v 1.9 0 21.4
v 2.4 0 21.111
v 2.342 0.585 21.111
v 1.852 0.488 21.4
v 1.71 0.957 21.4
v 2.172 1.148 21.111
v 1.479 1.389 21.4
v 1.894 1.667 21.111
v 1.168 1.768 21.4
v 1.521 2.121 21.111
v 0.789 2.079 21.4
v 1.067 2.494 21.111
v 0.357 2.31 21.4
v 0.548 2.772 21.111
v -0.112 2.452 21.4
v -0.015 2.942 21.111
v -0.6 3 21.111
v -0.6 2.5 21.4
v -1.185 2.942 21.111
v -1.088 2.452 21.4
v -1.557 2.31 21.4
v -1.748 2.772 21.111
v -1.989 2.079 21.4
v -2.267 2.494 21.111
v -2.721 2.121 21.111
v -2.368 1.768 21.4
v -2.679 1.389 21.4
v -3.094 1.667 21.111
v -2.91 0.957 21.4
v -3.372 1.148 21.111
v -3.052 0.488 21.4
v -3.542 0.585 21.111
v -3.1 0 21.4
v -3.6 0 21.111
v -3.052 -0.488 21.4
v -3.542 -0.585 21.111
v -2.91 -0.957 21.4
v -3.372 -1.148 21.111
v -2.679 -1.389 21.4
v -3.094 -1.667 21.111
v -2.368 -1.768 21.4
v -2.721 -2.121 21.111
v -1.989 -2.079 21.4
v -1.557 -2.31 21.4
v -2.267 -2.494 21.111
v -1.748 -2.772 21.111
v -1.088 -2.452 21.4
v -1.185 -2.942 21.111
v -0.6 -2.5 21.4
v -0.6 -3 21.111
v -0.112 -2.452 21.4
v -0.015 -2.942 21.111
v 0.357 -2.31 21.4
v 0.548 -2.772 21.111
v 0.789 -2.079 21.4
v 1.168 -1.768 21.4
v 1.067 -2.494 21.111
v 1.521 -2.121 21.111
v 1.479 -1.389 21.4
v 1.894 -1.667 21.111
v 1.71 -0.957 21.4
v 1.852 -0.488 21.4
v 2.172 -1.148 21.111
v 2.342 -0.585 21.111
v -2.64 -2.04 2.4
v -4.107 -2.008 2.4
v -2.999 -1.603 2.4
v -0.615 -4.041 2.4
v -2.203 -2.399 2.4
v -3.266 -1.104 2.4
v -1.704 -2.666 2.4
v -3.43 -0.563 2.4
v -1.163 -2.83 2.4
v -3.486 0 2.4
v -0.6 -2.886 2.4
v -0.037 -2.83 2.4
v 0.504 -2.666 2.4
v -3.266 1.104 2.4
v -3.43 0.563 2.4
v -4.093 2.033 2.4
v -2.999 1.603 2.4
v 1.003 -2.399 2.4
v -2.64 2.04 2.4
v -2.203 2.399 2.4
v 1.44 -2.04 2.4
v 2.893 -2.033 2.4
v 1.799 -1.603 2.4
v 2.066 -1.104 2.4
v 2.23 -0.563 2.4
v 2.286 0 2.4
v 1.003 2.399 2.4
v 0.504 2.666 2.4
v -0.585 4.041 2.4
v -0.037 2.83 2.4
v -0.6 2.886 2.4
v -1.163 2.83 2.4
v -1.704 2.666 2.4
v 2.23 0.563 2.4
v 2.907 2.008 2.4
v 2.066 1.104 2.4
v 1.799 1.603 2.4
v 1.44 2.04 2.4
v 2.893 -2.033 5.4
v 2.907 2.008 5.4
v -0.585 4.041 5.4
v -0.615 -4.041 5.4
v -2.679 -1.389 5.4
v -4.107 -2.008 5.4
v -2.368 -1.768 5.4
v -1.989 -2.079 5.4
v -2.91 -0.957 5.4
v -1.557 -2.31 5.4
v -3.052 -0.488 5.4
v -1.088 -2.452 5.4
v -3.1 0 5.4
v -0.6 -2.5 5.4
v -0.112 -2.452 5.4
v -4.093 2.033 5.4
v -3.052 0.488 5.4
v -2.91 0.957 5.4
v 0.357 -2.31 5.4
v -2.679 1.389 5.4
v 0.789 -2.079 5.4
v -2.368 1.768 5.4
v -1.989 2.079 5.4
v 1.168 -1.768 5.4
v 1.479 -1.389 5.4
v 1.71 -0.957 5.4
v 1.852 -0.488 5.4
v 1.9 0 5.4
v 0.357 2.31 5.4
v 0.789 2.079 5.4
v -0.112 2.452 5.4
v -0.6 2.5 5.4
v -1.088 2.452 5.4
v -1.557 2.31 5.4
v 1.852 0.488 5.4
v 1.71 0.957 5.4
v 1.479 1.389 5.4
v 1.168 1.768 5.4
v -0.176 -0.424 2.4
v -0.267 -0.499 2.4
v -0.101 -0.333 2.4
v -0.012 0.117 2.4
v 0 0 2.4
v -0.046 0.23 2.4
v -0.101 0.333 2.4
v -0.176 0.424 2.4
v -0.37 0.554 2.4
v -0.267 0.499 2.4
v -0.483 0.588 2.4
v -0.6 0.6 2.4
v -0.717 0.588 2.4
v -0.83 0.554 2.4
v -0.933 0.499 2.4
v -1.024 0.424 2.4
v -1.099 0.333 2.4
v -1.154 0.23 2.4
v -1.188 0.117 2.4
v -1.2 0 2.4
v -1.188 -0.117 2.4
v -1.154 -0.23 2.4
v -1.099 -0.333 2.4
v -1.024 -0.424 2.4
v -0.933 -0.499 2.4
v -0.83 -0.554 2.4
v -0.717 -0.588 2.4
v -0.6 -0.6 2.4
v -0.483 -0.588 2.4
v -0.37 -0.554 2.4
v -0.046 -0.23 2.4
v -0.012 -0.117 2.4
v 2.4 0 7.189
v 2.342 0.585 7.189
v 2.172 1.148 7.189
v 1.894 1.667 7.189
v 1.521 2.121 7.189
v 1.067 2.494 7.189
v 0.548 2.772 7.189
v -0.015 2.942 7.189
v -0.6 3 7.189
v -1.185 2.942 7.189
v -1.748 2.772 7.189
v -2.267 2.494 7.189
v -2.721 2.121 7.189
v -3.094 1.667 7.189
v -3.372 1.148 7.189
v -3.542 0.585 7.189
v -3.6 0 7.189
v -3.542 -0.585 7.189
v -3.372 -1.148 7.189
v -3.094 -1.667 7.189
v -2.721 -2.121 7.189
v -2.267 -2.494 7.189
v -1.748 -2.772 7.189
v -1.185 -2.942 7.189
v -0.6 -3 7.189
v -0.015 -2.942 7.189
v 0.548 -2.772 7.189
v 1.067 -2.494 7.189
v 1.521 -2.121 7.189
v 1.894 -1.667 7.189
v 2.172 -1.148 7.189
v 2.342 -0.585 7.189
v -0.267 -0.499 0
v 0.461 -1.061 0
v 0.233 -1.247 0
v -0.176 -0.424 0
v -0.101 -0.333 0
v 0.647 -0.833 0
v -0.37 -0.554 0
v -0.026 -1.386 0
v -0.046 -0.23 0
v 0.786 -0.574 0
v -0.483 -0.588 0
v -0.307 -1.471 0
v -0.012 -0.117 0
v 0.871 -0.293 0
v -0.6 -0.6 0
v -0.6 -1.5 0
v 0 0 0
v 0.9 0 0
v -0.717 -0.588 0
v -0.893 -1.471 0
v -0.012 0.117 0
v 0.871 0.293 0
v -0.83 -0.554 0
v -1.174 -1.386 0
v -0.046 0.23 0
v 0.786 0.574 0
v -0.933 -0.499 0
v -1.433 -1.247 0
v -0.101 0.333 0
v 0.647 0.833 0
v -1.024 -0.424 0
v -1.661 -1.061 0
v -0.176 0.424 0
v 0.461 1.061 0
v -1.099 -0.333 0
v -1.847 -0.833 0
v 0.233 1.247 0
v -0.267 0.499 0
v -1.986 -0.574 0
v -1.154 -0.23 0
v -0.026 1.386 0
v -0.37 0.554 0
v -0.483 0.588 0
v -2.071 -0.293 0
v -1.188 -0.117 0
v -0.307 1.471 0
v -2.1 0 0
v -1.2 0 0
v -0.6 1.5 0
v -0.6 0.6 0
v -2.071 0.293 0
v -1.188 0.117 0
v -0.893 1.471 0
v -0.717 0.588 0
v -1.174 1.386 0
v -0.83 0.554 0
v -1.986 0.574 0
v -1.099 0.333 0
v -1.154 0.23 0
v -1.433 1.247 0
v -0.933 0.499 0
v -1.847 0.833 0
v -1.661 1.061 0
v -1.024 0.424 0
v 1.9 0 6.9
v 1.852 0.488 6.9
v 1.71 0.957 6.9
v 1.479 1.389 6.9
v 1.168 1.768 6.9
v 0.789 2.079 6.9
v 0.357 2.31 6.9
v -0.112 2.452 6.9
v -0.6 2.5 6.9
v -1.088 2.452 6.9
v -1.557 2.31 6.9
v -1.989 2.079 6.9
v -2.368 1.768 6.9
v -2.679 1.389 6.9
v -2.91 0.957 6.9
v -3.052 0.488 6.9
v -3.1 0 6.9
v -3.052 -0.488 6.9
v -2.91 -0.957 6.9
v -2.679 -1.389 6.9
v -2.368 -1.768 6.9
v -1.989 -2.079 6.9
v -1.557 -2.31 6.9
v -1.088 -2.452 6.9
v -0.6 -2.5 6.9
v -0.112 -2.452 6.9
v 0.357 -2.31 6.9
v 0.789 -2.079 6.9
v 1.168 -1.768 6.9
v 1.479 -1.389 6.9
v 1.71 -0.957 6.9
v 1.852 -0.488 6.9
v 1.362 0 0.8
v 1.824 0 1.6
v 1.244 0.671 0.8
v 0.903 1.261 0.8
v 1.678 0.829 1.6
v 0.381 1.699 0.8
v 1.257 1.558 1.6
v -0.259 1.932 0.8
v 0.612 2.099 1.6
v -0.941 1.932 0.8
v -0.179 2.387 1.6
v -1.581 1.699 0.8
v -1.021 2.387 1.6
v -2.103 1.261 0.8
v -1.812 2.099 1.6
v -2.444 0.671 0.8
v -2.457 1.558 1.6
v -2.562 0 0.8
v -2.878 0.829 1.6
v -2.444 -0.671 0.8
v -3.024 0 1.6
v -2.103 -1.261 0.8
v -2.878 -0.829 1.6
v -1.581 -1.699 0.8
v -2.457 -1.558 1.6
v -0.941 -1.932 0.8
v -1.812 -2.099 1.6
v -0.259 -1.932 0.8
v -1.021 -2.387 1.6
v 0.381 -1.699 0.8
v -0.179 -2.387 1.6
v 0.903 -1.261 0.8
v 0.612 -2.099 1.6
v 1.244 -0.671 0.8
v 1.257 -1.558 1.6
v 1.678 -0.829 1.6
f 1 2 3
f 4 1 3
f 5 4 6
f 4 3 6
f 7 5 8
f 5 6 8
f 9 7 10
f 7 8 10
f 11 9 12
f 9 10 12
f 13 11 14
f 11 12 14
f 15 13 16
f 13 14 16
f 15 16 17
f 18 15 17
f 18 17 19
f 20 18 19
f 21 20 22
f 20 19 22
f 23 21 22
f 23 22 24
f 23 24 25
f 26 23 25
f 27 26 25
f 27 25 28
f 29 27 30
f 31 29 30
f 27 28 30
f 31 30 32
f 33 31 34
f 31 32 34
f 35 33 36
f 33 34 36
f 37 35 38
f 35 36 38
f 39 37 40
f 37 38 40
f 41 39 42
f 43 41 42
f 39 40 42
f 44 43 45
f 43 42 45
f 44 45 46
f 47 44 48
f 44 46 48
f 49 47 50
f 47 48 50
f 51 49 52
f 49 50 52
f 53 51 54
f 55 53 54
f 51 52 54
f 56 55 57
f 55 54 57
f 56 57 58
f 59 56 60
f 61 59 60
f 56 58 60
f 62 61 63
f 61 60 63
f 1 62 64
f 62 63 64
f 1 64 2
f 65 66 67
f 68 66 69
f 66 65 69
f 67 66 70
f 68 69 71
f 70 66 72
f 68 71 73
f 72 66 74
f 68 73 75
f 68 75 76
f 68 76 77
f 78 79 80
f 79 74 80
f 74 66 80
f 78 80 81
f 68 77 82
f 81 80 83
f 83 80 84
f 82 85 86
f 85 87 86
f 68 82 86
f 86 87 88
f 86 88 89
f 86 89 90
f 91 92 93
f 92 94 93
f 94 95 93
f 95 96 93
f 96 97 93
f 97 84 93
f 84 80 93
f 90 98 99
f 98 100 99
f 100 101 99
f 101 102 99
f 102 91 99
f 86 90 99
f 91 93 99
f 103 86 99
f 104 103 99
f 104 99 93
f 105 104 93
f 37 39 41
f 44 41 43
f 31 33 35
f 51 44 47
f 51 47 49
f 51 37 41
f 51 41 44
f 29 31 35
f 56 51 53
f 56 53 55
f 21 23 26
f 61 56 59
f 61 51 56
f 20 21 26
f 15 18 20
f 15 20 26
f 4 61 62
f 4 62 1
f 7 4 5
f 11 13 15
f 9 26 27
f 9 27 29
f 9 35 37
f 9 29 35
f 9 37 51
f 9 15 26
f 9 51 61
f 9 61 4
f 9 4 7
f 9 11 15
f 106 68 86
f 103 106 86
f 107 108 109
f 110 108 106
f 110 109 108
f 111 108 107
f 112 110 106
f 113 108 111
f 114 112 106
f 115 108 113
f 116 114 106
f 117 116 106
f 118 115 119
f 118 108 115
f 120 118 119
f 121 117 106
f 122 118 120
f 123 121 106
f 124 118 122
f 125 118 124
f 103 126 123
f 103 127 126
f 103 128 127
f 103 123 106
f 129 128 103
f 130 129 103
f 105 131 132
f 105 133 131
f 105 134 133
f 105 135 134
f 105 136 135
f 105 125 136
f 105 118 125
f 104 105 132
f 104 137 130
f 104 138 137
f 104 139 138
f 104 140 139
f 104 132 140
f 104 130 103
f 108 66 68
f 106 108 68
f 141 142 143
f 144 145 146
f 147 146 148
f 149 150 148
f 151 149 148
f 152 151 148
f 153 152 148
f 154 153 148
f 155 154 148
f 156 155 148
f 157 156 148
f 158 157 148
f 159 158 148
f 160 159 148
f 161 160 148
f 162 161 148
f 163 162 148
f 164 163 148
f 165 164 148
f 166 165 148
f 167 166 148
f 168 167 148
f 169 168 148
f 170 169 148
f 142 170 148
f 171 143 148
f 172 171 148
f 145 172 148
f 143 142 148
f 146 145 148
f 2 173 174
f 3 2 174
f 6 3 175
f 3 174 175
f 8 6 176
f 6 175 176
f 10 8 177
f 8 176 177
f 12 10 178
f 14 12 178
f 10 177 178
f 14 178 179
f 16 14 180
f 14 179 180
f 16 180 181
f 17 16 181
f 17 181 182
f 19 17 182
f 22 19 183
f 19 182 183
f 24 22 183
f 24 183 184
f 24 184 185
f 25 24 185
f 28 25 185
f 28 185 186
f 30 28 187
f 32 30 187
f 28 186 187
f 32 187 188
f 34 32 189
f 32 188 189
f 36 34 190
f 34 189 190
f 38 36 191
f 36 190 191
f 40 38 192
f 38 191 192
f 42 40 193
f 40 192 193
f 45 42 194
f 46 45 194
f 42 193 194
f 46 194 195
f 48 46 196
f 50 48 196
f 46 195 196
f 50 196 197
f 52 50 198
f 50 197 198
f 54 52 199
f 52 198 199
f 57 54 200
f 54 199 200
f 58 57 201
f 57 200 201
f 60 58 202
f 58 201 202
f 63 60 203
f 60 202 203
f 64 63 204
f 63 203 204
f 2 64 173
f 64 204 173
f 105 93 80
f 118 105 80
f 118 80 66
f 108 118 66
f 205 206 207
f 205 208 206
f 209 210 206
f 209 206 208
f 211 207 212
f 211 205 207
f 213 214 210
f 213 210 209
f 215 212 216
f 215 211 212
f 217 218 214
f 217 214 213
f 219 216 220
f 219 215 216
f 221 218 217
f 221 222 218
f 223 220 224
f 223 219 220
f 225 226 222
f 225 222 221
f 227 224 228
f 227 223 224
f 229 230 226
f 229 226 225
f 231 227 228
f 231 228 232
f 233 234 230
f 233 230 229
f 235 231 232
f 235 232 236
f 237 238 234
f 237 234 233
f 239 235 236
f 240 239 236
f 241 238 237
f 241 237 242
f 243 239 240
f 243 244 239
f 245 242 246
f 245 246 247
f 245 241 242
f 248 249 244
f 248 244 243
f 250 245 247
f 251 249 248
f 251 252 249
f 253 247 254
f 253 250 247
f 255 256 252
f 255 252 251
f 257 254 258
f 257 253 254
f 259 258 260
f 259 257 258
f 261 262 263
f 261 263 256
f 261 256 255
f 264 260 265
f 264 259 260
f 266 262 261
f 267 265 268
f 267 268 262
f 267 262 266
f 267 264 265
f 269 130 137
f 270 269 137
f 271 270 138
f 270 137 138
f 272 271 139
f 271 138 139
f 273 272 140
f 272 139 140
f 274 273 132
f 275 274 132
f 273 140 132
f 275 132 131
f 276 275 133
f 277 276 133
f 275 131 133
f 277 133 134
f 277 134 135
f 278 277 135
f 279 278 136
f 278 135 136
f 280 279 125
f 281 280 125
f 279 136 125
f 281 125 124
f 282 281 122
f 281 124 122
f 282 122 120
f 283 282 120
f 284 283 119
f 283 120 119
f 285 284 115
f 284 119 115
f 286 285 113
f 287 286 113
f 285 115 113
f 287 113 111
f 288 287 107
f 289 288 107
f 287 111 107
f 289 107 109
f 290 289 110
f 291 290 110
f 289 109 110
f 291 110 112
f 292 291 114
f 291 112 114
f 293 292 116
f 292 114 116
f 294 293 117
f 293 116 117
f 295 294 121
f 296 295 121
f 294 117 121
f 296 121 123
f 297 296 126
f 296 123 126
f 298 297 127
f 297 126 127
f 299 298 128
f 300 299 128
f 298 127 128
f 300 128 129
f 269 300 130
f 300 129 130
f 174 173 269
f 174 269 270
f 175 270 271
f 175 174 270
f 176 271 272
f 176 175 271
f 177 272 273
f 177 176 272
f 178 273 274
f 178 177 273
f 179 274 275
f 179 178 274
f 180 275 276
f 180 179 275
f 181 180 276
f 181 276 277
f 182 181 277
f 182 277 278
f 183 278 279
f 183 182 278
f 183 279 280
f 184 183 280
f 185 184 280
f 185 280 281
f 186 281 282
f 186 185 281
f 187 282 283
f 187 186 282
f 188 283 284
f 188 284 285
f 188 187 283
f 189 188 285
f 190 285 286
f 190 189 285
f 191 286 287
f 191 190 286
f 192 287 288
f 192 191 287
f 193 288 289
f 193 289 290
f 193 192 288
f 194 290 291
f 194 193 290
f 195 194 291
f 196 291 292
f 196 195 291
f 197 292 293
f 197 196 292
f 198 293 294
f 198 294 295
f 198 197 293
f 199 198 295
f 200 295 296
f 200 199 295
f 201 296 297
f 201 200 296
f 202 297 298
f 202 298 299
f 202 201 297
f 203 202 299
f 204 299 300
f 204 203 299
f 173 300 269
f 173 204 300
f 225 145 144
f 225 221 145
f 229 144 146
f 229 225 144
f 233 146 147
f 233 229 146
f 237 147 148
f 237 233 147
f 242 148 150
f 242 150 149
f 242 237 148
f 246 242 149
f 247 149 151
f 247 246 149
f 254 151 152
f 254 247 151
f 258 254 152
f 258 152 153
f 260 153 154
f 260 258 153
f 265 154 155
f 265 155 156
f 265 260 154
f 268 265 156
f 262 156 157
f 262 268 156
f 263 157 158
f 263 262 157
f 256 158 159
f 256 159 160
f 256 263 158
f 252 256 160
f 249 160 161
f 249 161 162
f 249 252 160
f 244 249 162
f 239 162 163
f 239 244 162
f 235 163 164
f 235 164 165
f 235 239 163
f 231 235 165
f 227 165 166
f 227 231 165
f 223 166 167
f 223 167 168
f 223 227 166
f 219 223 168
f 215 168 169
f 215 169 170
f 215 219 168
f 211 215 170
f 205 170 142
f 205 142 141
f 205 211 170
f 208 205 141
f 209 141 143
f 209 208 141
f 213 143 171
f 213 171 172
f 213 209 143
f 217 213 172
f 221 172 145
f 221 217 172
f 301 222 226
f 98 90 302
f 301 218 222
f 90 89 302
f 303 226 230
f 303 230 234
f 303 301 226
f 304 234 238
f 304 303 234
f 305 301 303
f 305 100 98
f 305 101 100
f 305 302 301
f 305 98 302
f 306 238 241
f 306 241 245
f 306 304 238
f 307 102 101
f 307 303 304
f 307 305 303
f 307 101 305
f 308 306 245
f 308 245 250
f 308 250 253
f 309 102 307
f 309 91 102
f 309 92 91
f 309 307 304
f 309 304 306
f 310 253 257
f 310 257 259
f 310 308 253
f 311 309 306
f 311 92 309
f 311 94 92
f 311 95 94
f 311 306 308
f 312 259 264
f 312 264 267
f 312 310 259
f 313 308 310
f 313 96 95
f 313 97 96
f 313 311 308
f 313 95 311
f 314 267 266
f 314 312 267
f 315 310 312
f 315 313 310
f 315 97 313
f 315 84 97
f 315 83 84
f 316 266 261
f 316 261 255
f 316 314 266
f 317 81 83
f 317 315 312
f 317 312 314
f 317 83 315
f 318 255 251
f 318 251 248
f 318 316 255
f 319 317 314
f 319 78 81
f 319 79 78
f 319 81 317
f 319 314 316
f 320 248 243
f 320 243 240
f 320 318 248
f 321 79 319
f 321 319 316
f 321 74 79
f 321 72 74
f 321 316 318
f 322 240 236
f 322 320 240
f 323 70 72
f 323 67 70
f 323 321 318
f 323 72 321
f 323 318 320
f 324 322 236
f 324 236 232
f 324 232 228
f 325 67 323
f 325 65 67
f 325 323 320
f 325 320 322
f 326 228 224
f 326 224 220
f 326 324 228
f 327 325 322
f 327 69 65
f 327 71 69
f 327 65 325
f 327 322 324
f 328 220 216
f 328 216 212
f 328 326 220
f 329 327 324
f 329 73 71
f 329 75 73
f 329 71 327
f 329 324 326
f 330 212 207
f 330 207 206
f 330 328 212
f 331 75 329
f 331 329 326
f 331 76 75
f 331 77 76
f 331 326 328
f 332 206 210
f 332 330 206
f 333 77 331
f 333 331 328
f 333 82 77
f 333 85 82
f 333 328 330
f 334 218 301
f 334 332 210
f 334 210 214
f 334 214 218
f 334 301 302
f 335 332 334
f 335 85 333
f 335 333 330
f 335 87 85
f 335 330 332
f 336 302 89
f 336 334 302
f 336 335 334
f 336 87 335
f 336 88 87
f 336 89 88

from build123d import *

# Parameters (mm, degrees)
F3_DEPTH   = 3
F4_R       = 2.5
F5_DEPTH   = 1.5
F6_R       = 3
F7_DEPTH   = 14.5
F8_SIZE2   = 0.2886751346
F8_SIZE    = 0.5
F8_2_SIZE2 = 0.288665
F8_2_SIZE  = 0.49999


# Not quite as in the source:
# - a fillet or chamfer is up to 0.001 mm smaller than in the source, because OpenCascade refuses the exact size


with BuildPart() as f1:
    # F0 (on Front) → F1 (revolve)
    with BuildSketch(Plane.XZ):
        Polygon((0, 2.4), (0, 0), (0.9, 0), (2.2856406461, 2.4), align=None)
    revolve(axis=Axis((-0.6, 0, 1.2), (0, 0, 1)))

    # F2 (on face) → F3 (join)
    with BuildSketch(Plane.XY.offset(2.4)):
        Polygon((2.9073034694, 2.0080228353), (-0.5853470521, 4.0414253209), (-4.0926505214, 2.0334024856), (-4.1073034694, -2.0080228353), (-0.6146529479, -4.0414253209), (2.8926505214, -2.0334024856), align=None)
    extrude(amount=F3_DEPTH)

    # F4 (on face) → F5 (join)
    with BuildSketch(Plane.XY.offset(5.4)):
        with Locations((-0.6, 0)):
            Circle(F4_R)
    extrude(amount=F5_DEPTH)

    # F6 (on face) → F7 (join)
    with BuildSketch(Plane.XY.offset(6.9)):
        with Locations((-0.6, 0)):
            Circle(F6_R)
    extrude(amount=F7_DEPTH)

    # F8
    f8_edges = [f1.edges().sort_by_distance(p)[0] for p in [
        (-3.6, 0, 21.4),
    ]]
    f8_side = f1.faces().sort_by_distance((-0.6, 0, 21.4))[0]
    chamfer(f8_edges, length=F8_SIZE, length2=F8_SIZE2, reference=f8_side)

    # F8#2 (size 0.5 and 0.2886751346 in the source; OpenCascade refuses exactly that, so slightly less here)
    f8_2_edges = [f1.edges().sort_by_distance(p)[0] for p in [
        (-3.6, 0, 6.9),
    ]]
    f8_2_side = f1.faces().sort_by_distance((-3.515147, 0, 6.9))[0]
    chamfer(f8_2_edges, length=F8_2_SIZE, length2=F8_2_SIZE2, reference=f8_2_side)


solid = f1.part
